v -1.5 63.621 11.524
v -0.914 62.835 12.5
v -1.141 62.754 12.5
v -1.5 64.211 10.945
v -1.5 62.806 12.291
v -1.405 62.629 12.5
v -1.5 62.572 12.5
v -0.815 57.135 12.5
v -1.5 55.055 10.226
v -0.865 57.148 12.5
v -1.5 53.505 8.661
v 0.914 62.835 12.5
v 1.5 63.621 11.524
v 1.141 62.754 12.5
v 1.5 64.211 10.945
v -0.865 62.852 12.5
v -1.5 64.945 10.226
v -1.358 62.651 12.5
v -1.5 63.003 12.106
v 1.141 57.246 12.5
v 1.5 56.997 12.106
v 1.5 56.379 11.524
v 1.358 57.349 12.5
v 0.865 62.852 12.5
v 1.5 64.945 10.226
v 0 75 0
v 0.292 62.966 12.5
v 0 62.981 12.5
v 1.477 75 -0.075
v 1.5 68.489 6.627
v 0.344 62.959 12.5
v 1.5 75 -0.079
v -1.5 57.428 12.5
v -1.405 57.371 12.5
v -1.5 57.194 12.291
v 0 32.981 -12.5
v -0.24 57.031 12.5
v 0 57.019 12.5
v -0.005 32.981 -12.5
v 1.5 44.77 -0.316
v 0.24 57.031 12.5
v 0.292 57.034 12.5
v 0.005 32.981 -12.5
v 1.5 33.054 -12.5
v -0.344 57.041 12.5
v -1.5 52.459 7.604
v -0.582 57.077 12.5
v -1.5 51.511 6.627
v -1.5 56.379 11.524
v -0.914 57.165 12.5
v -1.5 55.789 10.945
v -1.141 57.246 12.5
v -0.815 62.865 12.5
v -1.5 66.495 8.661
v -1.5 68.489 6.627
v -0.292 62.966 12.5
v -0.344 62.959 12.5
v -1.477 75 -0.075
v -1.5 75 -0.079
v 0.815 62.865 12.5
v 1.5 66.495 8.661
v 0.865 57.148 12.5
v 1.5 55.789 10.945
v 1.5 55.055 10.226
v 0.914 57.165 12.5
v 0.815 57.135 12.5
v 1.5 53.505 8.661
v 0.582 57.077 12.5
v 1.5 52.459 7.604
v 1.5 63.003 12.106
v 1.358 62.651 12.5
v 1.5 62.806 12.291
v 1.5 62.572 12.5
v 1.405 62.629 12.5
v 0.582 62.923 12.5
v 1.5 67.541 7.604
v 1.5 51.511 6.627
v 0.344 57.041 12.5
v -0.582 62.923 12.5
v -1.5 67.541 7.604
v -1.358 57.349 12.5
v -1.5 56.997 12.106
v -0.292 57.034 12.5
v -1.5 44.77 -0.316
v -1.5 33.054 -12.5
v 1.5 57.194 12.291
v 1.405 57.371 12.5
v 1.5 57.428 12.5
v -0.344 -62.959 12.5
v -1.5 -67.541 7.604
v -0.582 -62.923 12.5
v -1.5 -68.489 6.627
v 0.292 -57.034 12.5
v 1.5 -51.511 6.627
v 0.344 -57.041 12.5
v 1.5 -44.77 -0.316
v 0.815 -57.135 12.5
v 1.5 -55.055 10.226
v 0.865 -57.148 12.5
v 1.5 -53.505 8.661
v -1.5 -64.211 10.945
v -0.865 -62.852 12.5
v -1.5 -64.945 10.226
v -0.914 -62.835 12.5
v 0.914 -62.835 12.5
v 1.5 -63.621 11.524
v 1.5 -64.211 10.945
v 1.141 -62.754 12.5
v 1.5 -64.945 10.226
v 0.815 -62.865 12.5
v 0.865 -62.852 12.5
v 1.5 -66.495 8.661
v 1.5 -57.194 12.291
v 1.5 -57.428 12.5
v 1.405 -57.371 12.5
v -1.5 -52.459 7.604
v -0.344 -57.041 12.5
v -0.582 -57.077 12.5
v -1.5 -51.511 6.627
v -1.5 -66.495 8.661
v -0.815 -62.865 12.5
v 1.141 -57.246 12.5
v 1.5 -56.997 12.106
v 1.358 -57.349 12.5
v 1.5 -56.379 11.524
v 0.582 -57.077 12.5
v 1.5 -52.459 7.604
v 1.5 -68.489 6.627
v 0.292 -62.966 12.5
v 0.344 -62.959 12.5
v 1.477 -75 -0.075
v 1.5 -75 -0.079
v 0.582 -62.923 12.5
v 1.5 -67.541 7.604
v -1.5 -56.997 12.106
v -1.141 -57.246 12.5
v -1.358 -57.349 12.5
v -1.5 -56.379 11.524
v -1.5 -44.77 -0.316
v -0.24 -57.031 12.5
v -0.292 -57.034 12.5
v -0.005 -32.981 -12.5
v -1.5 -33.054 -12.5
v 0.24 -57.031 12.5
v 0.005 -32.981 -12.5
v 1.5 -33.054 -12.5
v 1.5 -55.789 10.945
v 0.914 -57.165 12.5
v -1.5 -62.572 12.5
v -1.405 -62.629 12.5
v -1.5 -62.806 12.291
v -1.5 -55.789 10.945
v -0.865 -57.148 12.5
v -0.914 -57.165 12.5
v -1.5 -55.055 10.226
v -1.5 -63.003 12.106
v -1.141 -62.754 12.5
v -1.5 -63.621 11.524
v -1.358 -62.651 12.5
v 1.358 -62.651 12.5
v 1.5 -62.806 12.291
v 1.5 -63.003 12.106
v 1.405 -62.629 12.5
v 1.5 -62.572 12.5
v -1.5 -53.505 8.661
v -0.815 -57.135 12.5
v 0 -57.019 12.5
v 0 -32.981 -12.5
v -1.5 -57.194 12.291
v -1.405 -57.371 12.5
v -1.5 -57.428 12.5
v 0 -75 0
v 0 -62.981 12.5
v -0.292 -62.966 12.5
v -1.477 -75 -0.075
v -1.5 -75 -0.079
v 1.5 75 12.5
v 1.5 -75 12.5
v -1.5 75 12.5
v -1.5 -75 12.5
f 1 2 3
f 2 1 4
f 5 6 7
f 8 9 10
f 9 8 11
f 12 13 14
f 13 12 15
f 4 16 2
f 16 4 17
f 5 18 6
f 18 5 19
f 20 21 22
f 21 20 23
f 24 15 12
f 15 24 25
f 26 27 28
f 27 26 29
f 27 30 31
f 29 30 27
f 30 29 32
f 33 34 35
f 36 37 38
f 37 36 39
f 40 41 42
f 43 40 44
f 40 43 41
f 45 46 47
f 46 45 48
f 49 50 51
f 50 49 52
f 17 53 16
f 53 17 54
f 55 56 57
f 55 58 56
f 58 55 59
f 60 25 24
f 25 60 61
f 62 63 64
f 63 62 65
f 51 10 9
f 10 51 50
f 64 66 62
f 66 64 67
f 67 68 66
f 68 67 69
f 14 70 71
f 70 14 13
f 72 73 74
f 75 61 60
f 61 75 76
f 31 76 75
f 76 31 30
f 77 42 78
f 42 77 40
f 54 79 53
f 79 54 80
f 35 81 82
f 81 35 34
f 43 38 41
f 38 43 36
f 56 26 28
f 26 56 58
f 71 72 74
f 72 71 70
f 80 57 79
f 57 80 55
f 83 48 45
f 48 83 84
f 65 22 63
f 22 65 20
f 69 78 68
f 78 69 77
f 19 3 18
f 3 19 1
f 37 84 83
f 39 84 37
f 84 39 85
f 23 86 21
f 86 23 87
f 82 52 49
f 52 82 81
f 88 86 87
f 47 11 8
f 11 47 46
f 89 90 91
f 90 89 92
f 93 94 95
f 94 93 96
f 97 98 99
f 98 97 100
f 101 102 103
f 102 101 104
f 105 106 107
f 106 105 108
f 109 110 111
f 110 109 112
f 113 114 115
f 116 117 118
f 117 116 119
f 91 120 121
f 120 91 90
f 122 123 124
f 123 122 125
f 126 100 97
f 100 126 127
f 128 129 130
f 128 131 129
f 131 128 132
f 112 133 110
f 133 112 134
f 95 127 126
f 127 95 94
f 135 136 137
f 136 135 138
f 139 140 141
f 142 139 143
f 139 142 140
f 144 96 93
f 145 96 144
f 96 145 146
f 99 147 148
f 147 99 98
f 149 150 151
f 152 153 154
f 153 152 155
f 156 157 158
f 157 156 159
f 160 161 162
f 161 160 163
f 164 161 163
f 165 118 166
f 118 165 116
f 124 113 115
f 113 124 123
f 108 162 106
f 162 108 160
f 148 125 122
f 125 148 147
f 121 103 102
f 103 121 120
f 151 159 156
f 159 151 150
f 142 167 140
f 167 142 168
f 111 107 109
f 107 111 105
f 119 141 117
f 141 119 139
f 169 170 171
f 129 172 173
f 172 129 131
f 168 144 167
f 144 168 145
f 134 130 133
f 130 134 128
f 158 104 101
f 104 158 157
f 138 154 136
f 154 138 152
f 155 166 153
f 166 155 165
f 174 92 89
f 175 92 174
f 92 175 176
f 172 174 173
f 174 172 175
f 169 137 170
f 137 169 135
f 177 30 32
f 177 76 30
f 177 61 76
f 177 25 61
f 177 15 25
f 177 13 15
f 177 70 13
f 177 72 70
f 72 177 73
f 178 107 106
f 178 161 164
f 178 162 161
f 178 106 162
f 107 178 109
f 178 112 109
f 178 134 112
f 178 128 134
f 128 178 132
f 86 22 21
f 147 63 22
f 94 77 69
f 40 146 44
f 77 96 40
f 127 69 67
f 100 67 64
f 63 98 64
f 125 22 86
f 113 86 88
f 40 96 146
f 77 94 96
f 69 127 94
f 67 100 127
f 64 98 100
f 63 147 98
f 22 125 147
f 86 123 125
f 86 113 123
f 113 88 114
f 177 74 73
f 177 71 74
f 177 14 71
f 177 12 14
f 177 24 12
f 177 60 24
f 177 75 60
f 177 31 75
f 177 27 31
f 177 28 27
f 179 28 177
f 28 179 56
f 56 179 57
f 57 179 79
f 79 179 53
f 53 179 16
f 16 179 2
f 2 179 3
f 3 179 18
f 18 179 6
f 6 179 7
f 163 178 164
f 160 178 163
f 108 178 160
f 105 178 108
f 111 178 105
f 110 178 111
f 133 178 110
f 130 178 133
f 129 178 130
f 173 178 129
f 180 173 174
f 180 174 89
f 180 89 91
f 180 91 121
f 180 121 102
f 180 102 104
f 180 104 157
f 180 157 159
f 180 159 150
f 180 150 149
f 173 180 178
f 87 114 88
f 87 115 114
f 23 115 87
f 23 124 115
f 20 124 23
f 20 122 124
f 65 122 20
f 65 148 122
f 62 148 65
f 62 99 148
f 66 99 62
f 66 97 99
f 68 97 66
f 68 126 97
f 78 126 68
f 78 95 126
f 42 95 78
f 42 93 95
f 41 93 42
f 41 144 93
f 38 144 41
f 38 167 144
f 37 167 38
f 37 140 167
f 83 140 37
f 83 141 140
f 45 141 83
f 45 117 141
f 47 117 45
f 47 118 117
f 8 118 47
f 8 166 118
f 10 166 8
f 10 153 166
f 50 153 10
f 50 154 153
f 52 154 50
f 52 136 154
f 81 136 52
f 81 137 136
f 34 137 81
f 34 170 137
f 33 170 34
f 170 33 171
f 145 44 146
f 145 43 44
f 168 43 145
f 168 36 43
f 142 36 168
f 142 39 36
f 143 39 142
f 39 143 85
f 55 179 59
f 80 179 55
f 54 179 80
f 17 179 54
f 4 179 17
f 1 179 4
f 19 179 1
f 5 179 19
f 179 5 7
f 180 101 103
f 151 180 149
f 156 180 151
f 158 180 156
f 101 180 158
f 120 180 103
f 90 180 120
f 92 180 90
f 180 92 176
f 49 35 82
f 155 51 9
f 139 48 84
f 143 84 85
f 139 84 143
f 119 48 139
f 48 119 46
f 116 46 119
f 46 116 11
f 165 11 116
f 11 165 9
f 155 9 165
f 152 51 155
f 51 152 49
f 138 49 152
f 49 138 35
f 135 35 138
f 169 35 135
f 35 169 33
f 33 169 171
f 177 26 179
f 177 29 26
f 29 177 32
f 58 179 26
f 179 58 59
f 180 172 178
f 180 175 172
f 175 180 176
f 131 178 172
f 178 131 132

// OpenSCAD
// file: plate_twin_lasers.scad
$fn=64;

plate_debth_new = 2.8;
plate_len = 120;
plate_width = 33;

module plate(plate_debth){
    difference(){
        base(plate_debth);
        holes();
    } 
}

module holes(){
    translate([0,-plate_len/2,0])
    cylinder(h = 40, d=6.5, center = true);
    
    translate([0,plate_len/2,0])
    cylinder(h = 40, d=6.5, center = true);
}

module base(plate_debth){
    cube([plate_width,plate_len,plate_debth], center = true);
    color("red")
    translate([0,-plate_len/2,0])
    cylinder(h=plate_debth, d=plate_width, center = true );
    color("green")
    translate([0,plate_len/2,0])
    cylinder(h=plate_debth, d=plate_width, center = true );
}
// main file
include <plate_twin_lasers.scad>
//rib(rib_debth = 3,rib_height = 15.5);
difference(){
rib_center(rib_debth=3, rib_height=25);
    holes();
}
module holes(){
    translate([0, plate_len/2])
    cylinder(d1=55, d2=5, h=25+1, center=true);
    
    translate([0, -plate_len/2])
    cylinder(d1=55, d2=5, h=25+1, center=true);
}
module rib_center(rib_debth,rib_height){

    cube([rib_debth,,150,rib_height], center = true);
}

module rib(rib_debth,rib_height){
    difference(){
        //scale([1,1,rib_height])
        plate(plate_debth=rib_height);
        translate([0,0,0])
        //scale([1,1,rib_height])
        cube([plate_width-rib_debth,plate_len,rib_height+1], center = true);
        
        color("red")
        translate([0,-plate_len/2,0])
        //scale([1,1,rib_height])
        cylinder(h=rib_height+1, d=plate_width-rib_debth, center = true );
        
        color("green")
        translate([0,plate_len/2,0])
        //scale([1,1,rib_height])
        cylinder(h=rib_height+1, d=plate_width-rib_debth, center = true );
    }
}
